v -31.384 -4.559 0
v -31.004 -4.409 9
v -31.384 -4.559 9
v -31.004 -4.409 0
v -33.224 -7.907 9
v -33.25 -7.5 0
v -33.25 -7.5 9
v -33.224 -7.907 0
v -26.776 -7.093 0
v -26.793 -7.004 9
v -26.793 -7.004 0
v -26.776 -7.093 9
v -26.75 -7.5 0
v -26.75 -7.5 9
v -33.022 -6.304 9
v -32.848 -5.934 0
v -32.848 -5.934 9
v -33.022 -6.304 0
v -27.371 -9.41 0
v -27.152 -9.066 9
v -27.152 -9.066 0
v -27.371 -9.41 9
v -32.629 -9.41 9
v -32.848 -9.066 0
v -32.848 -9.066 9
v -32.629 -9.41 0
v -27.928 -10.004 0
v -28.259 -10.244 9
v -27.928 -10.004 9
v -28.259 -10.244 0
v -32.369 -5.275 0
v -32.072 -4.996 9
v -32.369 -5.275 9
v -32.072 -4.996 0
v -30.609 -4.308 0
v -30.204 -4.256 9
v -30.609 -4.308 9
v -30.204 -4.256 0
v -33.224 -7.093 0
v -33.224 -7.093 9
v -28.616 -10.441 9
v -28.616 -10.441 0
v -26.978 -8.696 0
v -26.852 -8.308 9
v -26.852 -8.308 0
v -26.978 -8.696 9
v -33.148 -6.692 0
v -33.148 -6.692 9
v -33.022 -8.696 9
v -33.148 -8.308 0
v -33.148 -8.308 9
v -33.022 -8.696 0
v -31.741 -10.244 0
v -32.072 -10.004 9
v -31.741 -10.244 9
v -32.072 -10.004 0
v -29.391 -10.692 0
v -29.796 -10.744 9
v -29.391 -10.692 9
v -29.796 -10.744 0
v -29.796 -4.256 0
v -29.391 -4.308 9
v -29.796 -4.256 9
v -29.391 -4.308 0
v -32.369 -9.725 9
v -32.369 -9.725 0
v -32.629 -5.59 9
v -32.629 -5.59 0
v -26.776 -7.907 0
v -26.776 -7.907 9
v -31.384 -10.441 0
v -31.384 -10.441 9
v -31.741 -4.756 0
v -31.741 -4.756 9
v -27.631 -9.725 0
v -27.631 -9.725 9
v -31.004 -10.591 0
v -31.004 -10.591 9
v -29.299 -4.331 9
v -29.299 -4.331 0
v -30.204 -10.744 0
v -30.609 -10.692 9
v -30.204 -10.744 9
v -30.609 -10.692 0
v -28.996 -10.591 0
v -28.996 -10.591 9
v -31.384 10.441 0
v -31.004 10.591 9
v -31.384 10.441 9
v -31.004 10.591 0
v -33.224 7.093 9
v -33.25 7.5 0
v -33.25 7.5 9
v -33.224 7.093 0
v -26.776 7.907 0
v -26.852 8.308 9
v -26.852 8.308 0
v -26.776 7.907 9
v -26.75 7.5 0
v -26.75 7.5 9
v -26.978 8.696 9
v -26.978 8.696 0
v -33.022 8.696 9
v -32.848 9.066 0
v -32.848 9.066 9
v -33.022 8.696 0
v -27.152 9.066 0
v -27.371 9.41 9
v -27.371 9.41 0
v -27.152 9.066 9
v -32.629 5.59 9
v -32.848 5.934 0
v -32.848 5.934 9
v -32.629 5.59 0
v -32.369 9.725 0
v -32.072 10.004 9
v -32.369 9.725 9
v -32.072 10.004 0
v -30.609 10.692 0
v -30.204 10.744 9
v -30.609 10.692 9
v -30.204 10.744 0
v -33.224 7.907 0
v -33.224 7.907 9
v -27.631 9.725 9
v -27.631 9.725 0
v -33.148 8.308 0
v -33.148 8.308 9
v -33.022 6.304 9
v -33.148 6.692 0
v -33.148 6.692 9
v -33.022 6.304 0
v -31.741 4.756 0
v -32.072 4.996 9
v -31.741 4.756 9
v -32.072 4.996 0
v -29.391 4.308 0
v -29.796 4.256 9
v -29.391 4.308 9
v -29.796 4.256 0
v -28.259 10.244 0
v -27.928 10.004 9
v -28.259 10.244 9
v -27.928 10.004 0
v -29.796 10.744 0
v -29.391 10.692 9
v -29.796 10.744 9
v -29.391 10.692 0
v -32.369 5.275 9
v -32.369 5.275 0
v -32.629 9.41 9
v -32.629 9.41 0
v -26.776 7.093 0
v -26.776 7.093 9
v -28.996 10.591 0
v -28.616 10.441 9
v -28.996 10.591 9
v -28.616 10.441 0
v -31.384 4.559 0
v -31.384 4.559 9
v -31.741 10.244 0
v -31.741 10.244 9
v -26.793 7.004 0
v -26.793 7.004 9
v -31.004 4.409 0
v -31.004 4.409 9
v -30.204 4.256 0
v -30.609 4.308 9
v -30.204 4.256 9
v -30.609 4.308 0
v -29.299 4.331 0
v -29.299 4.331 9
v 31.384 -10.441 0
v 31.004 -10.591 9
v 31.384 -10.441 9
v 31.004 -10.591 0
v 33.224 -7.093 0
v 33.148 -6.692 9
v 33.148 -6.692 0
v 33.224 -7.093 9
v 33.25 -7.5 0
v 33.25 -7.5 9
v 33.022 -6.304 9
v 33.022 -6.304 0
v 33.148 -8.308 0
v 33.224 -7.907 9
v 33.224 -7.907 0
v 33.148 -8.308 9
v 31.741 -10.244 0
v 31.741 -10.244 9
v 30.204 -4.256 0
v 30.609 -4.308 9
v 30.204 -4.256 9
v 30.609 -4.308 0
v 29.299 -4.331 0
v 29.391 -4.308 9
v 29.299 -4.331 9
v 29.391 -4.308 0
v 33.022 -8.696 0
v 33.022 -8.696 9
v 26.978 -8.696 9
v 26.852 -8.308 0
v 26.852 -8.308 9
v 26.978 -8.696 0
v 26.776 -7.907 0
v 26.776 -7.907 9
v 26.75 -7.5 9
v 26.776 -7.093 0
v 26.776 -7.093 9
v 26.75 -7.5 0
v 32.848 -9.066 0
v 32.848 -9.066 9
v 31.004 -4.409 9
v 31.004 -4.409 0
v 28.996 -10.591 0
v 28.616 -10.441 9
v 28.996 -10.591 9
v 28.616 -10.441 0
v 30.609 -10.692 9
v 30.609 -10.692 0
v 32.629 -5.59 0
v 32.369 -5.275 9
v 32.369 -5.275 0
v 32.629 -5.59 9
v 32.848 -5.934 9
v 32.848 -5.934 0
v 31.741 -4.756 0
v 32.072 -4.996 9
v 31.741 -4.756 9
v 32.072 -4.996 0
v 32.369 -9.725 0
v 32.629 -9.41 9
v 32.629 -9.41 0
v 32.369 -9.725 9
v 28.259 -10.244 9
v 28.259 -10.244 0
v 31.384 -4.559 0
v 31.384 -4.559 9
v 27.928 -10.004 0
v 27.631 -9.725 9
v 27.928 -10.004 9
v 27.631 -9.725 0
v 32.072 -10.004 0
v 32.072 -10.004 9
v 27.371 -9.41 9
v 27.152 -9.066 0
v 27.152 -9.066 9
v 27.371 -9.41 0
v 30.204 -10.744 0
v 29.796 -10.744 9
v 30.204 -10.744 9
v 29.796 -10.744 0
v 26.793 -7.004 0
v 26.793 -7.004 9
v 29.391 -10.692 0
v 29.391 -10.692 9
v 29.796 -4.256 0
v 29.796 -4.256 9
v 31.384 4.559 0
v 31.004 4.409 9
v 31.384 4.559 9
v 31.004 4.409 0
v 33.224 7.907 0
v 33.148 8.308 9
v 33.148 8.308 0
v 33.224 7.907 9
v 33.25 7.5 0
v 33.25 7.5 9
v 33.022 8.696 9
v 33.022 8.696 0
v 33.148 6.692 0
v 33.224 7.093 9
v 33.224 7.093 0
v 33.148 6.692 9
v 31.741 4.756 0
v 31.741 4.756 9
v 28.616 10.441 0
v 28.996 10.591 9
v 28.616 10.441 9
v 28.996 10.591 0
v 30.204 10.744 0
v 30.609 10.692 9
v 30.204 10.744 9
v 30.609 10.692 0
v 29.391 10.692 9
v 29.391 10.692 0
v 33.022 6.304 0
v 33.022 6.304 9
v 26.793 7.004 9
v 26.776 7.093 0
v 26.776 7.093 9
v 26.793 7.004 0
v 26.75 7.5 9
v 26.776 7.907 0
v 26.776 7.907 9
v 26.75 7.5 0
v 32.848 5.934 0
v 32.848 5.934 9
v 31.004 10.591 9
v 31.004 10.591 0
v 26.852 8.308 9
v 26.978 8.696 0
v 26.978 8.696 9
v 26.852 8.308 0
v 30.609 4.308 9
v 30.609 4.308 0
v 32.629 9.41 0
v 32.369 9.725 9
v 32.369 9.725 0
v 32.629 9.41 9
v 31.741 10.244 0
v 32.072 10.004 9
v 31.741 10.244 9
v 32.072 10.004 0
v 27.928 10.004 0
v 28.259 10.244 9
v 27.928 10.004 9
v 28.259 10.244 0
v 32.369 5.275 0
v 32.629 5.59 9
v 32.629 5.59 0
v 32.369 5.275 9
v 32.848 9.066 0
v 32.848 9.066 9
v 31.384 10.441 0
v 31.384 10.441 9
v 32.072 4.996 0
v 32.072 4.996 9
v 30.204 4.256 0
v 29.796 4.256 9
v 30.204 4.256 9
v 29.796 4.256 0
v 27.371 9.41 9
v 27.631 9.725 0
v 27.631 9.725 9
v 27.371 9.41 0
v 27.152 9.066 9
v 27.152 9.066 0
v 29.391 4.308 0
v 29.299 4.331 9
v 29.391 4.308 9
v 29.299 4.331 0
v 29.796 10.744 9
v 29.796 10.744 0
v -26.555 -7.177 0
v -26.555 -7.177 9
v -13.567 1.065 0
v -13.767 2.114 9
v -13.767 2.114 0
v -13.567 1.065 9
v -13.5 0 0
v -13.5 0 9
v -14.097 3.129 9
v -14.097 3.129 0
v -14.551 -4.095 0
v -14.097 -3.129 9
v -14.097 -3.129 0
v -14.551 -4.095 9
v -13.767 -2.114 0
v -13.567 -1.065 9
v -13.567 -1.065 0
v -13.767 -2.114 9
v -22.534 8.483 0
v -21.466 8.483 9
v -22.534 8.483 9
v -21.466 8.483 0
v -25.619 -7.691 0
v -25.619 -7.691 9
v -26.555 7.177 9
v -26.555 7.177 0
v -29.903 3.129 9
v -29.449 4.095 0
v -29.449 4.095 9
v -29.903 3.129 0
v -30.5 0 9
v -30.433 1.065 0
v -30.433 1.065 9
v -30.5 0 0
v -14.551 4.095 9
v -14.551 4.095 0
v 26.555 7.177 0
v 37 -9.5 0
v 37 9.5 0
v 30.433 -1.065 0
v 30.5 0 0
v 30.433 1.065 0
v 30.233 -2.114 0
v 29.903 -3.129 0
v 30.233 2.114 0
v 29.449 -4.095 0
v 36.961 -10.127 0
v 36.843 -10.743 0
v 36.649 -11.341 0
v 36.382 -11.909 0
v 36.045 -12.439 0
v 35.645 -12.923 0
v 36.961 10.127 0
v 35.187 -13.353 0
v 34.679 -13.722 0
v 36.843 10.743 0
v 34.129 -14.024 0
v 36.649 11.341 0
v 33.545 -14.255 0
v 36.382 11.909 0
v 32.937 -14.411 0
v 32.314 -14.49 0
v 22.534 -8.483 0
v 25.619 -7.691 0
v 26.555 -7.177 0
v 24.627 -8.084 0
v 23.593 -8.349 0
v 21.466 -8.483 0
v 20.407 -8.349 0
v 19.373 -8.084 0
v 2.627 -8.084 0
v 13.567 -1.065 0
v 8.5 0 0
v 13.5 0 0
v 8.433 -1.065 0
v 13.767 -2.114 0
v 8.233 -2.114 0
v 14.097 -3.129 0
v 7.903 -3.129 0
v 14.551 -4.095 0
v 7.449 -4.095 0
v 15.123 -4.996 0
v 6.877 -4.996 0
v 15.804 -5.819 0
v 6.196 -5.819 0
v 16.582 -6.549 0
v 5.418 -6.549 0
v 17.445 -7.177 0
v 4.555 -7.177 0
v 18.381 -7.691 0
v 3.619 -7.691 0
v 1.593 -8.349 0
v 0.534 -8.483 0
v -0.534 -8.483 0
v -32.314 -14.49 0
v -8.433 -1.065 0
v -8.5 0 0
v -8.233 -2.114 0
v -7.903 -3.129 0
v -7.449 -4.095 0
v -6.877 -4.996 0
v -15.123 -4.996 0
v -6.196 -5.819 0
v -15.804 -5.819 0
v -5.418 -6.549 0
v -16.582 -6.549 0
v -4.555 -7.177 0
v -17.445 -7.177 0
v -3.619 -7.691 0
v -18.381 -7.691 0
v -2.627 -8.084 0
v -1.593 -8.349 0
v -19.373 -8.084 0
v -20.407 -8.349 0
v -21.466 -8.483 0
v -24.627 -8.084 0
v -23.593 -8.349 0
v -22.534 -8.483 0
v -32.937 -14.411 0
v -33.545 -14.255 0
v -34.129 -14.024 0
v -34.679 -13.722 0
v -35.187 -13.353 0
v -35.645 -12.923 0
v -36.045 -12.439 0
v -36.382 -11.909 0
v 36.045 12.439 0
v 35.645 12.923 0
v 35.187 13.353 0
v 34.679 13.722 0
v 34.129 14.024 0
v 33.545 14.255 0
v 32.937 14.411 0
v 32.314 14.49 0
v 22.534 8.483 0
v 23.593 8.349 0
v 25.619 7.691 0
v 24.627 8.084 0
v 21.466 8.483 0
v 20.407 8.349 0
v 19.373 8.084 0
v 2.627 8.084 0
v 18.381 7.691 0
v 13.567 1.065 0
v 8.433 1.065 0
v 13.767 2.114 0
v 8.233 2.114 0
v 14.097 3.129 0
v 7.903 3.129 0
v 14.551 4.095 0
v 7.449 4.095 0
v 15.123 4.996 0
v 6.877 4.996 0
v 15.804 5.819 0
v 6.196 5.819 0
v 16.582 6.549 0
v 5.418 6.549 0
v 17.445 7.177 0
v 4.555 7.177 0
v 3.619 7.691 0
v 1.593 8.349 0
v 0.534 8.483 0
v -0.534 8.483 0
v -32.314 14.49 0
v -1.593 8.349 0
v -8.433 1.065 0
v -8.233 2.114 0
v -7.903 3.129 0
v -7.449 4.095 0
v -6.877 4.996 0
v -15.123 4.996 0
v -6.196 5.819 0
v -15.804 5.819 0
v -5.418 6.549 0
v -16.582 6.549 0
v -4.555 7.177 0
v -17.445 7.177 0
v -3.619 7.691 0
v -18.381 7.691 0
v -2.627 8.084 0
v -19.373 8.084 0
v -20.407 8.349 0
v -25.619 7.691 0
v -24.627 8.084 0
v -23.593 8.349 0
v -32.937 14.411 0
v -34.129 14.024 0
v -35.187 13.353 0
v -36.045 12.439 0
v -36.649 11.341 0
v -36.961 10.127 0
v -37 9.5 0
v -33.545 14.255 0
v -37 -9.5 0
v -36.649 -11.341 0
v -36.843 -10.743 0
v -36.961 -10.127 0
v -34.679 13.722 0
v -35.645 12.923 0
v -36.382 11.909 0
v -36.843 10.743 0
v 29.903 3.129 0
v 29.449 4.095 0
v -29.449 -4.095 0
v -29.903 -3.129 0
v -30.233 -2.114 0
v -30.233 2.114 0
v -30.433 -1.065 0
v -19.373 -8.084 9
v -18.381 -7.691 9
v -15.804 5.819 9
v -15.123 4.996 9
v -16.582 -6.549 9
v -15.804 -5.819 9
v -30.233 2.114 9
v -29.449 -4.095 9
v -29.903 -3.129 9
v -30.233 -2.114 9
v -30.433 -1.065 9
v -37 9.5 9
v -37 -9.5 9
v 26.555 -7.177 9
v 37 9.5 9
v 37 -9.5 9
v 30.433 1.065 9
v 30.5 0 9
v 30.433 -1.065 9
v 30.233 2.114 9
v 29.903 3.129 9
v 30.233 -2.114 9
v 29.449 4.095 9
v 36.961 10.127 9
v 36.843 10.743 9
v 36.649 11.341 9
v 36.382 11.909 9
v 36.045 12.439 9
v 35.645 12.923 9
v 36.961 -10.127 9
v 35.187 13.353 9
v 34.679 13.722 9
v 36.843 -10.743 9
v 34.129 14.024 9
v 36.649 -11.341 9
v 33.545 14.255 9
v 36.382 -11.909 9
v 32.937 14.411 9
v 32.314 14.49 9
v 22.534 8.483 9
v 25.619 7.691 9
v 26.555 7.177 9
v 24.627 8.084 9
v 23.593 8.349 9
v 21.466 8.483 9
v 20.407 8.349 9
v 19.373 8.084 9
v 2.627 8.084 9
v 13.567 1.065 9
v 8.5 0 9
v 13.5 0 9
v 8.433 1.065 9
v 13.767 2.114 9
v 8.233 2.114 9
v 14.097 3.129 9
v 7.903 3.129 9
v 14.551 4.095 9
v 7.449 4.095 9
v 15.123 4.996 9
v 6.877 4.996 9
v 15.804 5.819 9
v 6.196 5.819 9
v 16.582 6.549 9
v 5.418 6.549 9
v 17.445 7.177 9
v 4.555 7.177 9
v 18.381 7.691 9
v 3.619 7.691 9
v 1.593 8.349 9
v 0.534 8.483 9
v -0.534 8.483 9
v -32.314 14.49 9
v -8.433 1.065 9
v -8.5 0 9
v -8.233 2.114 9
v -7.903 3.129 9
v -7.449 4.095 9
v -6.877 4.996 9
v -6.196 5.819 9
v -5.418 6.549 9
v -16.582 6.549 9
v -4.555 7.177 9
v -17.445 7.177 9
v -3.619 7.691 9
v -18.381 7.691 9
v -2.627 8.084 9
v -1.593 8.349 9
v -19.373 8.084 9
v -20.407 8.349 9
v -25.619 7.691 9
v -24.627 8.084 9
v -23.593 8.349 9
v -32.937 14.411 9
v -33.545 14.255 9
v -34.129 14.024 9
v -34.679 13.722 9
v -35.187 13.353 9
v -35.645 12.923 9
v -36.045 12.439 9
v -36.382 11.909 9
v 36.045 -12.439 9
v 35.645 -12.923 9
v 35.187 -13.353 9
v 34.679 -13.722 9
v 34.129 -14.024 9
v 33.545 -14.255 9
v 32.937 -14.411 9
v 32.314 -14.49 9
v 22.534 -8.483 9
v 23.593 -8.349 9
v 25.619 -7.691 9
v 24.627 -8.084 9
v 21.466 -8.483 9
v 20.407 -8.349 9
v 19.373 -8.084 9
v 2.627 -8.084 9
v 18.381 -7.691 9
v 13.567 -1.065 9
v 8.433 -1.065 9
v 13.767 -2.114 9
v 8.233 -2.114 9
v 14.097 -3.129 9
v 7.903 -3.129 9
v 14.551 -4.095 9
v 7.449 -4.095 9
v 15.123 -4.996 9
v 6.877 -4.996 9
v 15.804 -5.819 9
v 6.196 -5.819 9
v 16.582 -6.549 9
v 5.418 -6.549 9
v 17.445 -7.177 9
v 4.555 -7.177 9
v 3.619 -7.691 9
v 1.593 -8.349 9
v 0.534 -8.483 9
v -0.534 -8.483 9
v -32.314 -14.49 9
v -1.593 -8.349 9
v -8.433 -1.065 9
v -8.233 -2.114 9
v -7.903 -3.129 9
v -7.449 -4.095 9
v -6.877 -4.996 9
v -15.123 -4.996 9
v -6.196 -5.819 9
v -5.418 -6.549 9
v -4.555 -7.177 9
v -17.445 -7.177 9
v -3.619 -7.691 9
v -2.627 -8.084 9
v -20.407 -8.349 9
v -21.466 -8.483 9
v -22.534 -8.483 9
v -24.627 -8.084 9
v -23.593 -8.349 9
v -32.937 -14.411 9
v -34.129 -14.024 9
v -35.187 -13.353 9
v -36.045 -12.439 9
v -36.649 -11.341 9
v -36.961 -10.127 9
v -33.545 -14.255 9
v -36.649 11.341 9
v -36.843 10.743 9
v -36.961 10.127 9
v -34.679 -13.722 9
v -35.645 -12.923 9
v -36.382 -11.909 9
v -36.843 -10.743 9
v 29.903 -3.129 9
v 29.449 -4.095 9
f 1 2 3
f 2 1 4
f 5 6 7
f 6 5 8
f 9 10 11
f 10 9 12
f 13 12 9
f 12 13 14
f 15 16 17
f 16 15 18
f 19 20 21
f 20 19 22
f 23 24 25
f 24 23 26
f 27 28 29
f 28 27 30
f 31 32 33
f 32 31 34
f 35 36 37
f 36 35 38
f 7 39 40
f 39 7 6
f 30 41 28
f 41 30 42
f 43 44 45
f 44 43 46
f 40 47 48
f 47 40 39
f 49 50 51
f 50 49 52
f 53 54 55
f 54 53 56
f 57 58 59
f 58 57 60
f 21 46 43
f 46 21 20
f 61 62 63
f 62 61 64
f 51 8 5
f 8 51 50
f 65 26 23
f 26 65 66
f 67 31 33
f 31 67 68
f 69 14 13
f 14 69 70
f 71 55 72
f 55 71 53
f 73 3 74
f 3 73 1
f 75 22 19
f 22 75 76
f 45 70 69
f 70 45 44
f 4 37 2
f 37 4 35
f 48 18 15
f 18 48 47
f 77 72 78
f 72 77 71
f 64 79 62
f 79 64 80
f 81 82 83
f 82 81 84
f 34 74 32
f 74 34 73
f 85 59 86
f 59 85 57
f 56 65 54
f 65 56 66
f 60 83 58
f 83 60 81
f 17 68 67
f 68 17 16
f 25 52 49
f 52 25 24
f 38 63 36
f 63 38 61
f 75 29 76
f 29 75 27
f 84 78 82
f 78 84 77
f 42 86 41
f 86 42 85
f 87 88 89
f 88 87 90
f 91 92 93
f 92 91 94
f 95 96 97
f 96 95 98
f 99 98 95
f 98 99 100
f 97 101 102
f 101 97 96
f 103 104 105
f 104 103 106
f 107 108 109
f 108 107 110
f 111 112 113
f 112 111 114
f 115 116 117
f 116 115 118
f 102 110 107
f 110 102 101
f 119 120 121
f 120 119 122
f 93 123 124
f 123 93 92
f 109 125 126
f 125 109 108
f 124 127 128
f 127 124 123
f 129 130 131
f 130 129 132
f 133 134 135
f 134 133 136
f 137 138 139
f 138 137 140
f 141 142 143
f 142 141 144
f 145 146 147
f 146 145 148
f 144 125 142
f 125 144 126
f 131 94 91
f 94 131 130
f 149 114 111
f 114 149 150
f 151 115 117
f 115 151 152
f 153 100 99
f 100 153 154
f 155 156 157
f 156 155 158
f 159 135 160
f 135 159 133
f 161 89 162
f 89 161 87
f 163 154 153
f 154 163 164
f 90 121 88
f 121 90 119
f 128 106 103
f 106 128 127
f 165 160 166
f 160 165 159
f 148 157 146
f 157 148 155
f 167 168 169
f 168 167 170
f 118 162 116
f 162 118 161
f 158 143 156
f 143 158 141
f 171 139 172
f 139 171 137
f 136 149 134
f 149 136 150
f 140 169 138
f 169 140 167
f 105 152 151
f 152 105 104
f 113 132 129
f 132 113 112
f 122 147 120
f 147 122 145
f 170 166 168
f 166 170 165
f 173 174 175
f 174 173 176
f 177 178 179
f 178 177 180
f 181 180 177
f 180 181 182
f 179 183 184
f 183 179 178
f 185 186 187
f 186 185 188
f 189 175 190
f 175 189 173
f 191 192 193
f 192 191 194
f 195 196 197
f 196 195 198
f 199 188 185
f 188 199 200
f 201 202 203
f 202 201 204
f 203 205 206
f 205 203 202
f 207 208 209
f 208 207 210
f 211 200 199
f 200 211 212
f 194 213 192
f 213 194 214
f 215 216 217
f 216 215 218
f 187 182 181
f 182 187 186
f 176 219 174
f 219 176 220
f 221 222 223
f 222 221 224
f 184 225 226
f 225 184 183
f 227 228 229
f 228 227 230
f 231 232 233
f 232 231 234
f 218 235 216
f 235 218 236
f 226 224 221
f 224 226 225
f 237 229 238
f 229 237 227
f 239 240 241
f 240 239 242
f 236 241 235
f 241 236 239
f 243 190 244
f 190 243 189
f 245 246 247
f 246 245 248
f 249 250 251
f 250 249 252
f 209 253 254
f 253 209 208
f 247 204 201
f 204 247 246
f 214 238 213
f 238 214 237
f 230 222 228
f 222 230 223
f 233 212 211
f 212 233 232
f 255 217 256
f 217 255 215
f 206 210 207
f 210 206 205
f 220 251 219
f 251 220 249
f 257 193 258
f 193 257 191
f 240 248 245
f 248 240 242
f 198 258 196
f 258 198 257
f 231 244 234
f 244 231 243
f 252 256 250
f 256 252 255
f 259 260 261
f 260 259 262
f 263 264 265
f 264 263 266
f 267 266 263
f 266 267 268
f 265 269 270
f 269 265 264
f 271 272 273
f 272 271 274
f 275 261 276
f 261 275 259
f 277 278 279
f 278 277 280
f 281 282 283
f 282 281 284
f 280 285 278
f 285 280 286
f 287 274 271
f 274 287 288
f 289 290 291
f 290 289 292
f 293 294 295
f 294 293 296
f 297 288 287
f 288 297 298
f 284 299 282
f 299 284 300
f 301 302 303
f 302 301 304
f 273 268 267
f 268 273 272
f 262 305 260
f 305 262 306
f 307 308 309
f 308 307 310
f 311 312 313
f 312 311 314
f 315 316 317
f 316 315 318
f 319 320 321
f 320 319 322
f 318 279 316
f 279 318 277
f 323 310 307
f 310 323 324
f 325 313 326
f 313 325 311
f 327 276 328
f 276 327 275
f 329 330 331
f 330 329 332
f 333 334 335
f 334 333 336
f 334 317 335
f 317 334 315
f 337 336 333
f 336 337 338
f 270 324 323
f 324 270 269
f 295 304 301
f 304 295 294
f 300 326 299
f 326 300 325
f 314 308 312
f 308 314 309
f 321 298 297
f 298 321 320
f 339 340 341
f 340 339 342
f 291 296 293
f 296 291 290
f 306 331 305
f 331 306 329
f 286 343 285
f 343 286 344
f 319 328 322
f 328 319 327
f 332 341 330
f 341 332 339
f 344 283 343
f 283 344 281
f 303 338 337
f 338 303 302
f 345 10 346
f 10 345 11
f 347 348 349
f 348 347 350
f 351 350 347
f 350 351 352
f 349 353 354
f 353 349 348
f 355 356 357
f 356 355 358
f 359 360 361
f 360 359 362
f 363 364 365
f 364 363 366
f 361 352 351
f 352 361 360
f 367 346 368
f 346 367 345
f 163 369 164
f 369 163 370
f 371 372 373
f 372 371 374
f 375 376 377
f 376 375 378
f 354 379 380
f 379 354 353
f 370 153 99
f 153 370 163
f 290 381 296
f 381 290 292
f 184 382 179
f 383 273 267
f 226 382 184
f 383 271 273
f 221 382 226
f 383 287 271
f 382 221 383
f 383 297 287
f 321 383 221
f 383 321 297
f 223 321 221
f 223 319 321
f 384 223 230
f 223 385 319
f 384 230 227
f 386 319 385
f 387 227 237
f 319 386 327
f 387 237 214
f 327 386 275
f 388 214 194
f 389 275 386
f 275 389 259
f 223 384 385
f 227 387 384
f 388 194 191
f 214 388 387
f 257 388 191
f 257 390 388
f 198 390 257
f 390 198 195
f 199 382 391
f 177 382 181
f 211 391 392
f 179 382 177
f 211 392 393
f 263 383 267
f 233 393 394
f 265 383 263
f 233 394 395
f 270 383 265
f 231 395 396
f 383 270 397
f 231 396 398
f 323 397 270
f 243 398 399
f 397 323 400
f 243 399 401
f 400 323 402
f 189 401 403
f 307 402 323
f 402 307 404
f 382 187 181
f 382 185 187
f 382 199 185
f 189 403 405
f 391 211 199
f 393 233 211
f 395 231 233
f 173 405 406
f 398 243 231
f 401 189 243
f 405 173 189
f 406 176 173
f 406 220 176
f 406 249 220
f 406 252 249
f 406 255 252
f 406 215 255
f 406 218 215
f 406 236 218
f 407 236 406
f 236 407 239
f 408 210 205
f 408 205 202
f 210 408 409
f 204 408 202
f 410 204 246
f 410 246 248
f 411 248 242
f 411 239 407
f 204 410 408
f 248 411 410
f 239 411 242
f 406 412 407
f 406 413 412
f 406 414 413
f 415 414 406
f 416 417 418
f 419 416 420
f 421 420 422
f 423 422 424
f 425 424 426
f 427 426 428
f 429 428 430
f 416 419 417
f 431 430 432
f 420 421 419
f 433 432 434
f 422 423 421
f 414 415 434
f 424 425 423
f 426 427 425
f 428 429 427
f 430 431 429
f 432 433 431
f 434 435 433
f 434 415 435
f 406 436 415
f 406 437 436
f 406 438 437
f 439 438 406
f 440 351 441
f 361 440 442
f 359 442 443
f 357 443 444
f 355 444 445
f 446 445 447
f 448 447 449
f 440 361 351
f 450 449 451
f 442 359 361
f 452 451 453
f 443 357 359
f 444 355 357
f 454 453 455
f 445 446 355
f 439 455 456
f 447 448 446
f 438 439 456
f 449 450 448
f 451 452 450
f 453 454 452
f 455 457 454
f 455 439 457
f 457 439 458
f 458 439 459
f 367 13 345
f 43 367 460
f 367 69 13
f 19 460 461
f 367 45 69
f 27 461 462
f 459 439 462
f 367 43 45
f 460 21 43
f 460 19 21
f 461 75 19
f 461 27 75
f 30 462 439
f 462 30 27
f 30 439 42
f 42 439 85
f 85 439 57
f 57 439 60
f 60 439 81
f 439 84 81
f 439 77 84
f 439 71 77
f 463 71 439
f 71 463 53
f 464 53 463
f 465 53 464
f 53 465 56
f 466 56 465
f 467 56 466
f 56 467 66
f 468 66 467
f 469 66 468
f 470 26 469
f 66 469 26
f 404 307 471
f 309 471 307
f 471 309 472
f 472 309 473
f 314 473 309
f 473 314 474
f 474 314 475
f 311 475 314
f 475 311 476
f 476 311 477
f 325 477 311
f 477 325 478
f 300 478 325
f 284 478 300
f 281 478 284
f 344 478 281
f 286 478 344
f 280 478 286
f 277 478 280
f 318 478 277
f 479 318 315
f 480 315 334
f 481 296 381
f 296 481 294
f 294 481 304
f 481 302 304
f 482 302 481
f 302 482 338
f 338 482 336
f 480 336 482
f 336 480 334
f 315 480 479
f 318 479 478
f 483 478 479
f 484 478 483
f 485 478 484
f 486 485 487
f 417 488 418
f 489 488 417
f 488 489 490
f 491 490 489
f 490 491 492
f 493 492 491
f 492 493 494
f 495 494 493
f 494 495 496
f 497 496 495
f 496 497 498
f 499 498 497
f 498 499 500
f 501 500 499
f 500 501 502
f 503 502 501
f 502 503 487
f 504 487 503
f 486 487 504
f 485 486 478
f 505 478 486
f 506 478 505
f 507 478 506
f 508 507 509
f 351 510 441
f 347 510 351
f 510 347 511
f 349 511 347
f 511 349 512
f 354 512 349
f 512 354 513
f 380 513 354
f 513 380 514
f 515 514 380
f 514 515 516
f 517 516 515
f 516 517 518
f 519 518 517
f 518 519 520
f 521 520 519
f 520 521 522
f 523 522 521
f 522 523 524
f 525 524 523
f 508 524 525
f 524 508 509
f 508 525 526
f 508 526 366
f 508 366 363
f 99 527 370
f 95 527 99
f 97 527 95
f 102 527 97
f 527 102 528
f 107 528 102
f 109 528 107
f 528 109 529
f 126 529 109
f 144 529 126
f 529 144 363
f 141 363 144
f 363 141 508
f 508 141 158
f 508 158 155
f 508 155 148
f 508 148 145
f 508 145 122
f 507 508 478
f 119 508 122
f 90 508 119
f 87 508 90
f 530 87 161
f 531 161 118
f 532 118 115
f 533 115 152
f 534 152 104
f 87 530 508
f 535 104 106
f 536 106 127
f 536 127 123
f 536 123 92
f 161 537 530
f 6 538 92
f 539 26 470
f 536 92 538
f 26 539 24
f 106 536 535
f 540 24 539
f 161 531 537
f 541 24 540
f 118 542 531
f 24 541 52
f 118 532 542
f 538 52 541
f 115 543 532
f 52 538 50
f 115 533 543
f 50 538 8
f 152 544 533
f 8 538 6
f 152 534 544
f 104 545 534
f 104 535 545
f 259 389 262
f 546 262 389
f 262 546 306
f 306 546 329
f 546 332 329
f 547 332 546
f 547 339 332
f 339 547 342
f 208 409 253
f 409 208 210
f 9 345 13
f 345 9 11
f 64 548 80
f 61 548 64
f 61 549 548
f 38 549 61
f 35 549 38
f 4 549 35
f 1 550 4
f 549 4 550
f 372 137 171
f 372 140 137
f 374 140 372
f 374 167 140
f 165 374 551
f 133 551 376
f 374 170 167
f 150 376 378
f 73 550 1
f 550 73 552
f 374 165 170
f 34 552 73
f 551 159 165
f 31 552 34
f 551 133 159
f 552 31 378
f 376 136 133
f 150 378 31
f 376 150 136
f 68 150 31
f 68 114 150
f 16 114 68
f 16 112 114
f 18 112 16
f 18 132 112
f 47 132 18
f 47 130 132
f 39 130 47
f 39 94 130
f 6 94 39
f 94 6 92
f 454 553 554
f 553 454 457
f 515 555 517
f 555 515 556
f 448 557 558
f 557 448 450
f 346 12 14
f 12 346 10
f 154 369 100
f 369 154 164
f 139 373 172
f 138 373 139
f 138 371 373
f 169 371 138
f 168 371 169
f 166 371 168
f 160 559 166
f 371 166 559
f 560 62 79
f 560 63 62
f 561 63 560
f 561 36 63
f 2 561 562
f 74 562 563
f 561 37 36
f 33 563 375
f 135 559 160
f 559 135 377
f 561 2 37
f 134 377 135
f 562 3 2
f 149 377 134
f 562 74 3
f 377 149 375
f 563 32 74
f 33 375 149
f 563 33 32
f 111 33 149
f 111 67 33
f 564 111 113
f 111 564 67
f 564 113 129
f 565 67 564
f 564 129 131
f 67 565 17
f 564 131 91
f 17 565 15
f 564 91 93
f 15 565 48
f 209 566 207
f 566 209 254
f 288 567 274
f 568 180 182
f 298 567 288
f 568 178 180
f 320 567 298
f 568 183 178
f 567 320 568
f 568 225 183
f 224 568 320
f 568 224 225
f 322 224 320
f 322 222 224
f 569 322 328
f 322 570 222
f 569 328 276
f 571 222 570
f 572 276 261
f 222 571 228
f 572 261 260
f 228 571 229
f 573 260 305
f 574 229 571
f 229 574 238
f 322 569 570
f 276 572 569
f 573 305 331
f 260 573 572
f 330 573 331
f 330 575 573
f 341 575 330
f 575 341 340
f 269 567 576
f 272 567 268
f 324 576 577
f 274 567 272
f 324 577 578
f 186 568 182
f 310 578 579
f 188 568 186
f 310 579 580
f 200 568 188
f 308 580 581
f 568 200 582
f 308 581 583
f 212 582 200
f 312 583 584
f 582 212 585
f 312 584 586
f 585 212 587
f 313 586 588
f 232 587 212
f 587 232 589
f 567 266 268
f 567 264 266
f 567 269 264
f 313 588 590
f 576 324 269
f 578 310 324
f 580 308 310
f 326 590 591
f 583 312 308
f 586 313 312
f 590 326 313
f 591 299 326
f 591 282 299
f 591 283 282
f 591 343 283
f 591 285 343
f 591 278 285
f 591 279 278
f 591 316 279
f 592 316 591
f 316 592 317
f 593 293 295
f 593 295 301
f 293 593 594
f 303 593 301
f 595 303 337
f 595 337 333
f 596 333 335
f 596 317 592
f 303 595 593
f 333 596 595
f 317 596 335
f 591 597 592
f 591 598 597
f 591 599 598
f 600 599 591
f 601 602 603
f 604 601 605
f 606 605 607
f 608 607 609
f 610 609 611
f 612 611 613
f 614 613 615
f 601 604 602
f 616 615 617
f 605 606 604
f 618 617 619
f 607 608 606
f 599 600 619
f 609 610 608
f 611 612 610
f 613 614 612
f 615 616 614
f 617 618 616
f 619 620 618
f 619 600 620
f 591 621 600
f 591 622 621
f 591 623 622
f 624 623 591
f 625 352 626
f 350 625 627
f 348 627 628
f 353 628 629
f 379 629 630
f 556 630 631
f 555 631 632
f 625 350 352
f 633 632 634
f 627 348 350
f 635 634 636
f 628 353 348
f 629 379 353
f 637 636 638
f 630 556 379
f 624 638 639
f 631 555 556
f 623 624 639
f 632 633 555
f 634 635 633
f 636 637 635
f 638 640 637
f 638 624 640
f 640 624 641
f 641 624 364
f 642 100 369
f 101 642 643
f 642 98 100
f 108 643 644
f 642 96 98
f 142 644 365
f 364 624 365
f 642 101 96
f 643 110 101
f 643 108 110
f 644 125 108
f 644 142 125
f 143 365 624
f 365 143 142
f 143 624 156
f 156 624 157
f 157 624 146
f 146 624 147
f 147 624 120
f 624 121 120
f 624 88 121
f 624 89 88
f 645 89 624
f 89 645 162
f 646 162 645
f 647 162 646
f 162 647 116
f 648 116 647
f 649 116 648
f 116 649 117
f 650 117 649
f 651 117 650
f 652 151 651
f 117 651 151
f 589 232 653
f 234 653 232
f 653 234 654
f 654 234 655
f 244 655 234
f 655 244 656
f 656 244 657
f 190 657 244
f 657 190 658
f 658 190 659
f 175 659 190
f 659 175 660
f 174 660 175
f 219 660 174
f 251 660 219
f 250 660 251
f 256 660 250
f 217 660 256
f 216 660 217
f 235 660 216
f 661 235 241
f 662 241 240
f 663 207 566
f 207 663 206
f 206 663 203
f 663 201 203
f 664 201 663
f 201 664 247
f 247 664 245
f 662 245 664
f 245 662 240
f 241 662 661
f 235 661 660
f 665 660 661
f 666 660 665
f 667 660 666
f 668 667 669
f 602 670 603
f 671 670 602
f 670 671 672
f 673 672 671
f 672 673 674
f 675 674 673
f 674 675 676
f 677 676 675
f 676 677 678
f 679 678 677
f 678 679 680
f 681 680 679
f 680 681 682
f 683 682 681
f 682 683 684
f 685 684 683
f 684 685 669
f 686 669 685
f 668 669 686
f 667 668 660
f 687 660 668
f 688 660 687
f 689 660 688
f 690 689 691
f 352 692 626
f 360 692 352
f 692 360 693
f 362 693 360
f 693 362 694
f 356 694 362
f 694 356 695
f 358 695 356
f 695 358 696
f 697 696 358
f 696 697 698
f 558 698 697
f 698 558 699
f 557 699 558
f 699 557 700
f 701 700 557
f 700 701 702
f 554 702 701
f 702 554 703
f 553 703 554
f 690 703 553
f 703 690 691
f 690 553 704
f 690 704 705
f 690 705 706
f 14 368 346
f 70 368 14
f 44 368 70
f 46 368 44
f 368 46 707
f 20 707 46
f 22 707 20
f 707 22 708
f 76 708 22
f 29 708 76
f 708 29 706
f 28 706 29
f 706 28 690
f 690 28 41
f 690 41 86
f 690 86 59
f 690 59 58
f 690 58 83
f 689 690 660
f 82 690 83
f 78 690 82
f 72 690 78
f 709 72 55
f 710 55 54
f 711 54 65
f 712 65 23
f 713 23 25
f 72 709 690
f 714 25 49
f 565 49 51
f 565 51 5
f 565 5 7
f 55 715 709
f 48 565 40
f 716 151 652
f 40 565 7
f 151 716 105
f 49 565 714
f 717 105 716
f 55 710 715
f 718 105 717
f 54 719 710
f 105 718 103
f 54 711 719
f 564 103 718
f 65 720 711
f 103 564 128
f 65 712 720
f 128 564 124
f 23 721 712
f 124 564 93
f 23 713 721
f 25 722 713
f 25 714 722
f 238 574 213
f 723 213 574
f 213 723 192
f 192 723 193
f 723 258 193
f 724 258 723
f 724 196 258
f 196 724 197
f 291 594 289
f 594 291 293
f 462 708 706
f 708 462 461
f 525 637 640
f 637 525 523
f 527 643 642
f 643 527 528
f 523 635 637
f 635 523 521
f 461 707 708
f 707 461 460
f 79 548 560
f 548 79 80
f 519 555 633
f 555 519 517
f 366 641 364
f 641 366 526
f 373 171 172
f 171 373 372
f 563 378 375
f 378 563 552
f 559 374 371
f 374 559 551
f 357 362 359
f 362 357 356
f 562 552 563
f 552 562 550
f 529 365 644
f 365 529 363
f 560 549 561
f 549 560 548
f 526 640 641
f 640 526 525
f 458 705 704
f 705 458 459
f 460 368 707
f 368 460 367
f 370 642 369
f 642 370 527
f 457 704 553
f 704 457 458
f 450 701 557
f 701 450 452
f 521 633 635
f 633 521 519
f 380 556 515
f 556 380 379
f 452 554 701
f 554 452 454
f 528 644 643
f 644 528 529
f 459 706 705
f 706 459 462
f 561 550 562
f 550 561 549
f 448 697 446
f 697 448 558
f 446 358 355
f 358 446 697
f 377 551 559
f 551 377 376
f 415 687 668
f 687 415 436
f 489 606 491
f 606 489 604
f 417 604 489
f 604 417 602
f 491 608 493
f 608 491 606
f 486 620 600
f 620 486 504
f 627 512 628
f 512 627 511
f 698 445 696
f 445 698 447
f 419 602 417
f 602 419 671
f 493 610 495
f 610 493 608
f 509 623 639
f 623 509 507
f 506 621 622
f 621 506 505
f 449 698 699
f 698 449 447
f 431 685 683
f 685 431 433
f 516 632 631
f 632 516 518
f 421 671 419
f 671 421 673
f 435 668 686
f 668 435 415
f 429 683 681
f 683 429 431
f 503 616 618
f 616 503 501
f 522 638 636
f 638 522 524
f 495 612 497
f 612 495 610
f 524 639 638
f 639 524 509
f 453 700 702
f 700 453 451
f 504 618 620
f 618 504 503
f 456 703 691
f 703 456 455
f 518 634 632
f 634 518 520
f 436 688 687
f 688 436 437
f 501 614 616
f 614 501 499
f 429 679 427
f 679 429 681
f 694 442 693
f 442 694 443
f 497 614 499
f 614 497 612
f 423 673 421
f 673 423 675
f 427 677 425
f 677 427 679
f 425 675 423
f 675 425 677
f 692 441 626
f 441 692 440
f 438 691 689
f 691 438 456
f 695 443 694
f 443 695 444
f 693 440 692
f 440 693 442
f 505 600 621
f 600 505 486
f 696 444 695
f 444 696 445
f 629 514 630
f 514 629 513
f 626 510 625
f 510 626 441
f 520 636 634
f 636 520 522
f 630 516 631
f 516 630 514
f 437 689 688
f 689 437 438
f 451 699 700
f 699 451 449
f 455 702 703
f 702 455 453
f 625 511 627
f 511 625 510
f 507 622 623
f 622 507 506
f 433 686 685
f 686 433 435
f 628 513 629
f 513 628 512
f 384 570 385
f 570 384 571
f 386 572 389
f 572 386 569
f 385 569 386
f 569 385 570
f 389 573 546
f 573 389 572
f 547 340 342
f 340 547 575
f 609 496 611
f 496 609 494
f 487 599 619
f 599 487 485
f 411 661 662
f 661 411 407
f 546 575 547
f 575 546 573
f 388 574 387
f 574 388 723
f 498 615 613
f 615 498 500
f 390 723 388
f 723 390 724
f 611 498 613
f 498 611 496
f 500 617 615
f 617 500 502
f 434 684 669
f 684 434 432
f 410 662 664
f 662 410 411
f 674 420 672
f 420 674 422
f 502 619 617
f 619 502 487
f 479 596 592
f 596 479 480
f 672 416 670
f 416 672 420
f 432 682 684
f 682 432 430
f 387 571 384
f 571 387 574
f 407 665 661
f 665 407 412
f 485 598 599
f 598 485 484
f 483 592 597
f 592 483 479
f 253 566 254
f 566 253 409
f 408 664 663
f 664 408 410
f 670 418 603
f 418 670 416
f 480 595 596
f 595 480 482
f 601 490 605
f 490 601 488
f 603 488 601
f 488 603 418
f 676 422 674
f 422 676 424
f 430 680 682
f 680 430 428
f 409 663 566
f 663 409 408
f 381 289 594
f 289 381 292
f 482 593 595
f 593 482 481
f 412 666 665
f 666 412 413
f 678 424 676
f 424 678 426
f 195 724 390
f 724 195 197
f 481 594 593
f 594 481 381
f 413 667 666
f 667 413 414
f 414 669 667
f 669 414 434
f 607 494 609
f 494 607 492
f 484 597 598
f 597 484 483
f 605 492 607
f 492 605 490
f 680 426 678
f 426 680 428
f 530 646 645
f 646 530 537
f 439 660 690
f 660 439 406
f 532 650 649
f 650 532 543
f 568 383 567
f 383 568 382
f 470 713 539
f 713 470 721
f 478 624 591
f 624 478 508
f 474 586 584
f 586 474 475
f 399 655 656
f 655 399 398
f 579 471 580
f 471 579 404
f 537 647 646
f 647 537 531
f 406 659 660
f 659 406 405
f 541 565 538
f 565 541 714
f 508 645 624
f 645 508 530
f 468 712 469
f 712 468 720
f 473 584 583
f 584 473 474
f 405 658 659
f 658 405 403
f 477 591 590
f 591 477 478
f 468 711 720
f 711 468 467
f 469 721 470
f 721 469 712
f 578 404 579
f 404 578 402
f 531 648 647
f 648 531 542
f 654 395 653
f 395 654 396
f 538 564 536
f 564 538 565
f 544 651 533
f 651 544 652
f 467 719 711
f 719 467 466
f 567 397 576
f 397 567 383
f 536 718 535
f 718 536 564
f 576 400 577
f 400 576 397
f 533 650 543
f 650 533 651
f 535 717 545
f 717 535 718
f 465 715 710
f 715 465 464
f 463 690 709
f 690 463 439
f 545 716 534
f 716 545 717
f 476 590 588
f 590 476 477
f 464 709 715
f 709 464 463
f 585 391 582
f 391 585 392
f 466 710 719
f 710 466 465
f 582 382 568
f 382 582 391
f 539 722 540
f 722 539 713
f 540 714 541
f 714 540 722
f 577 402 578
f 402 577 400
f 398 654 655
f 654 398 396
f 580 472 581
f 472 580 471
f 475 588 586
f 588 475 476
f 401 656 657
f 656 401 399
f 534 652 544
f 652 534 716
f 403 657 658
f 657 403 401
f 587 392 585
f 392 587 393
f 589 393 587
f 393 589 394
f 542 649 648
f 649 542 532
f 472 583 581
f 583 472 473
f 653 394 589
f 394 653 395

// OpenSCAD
$fn = 50;


difference() {
	union() {
		hull() {
			translate(v = [-32.0000000000, 9.5000000000, 0]) {
				cylinder(h = 9, r = 5);
			}
			translate(v = [32.0000000000, 9.5000000000, 0]) {
				cylinder(h = 9, r = 5);
			}
			translate(v = [-32.0000000000, -9.5000000000, 0]) {
				cylinder(h = 9, r = 5);
			}
			translate(v = [32.0000000000, -9.5000000000, 0]) {
				cylinder(h = 9, r = 5);
			}
		}
	}
	union() {
		#translate(v = [-30.0000000000, -7.5000000000, -100.0000000000]) {
			cylinder(h = 200, r = 3.2500000000);
		}
		#translate(v = [-30.0000000000, 7.5000000000, -100.0000000000]) {
			cylinder(h = 200, r = 3.2500000000);
		}
		#translate(v = [30.0000000000, -7.5000000000, -100.0000000000]) {
			cylinder(h = 200, r = 3.2500000000);
		}
		#translate(v = [30.0000000000, 7.5000000000, -100.0000000000]) {
			cylinder(h = 200, r = 3.2500000000);
		}
		#translate(v = [-22.0000000000, 0, 0]) {
			cylinder(h = 9, r = 8.5000000000);
		}
		#cylinder(h = 9, r = 8.5000000000);
		#translate(v = [22.0000000000, 0, 0]) {
			cylinder(h = 9, r = 8.5000000000);
		}
	}
}
